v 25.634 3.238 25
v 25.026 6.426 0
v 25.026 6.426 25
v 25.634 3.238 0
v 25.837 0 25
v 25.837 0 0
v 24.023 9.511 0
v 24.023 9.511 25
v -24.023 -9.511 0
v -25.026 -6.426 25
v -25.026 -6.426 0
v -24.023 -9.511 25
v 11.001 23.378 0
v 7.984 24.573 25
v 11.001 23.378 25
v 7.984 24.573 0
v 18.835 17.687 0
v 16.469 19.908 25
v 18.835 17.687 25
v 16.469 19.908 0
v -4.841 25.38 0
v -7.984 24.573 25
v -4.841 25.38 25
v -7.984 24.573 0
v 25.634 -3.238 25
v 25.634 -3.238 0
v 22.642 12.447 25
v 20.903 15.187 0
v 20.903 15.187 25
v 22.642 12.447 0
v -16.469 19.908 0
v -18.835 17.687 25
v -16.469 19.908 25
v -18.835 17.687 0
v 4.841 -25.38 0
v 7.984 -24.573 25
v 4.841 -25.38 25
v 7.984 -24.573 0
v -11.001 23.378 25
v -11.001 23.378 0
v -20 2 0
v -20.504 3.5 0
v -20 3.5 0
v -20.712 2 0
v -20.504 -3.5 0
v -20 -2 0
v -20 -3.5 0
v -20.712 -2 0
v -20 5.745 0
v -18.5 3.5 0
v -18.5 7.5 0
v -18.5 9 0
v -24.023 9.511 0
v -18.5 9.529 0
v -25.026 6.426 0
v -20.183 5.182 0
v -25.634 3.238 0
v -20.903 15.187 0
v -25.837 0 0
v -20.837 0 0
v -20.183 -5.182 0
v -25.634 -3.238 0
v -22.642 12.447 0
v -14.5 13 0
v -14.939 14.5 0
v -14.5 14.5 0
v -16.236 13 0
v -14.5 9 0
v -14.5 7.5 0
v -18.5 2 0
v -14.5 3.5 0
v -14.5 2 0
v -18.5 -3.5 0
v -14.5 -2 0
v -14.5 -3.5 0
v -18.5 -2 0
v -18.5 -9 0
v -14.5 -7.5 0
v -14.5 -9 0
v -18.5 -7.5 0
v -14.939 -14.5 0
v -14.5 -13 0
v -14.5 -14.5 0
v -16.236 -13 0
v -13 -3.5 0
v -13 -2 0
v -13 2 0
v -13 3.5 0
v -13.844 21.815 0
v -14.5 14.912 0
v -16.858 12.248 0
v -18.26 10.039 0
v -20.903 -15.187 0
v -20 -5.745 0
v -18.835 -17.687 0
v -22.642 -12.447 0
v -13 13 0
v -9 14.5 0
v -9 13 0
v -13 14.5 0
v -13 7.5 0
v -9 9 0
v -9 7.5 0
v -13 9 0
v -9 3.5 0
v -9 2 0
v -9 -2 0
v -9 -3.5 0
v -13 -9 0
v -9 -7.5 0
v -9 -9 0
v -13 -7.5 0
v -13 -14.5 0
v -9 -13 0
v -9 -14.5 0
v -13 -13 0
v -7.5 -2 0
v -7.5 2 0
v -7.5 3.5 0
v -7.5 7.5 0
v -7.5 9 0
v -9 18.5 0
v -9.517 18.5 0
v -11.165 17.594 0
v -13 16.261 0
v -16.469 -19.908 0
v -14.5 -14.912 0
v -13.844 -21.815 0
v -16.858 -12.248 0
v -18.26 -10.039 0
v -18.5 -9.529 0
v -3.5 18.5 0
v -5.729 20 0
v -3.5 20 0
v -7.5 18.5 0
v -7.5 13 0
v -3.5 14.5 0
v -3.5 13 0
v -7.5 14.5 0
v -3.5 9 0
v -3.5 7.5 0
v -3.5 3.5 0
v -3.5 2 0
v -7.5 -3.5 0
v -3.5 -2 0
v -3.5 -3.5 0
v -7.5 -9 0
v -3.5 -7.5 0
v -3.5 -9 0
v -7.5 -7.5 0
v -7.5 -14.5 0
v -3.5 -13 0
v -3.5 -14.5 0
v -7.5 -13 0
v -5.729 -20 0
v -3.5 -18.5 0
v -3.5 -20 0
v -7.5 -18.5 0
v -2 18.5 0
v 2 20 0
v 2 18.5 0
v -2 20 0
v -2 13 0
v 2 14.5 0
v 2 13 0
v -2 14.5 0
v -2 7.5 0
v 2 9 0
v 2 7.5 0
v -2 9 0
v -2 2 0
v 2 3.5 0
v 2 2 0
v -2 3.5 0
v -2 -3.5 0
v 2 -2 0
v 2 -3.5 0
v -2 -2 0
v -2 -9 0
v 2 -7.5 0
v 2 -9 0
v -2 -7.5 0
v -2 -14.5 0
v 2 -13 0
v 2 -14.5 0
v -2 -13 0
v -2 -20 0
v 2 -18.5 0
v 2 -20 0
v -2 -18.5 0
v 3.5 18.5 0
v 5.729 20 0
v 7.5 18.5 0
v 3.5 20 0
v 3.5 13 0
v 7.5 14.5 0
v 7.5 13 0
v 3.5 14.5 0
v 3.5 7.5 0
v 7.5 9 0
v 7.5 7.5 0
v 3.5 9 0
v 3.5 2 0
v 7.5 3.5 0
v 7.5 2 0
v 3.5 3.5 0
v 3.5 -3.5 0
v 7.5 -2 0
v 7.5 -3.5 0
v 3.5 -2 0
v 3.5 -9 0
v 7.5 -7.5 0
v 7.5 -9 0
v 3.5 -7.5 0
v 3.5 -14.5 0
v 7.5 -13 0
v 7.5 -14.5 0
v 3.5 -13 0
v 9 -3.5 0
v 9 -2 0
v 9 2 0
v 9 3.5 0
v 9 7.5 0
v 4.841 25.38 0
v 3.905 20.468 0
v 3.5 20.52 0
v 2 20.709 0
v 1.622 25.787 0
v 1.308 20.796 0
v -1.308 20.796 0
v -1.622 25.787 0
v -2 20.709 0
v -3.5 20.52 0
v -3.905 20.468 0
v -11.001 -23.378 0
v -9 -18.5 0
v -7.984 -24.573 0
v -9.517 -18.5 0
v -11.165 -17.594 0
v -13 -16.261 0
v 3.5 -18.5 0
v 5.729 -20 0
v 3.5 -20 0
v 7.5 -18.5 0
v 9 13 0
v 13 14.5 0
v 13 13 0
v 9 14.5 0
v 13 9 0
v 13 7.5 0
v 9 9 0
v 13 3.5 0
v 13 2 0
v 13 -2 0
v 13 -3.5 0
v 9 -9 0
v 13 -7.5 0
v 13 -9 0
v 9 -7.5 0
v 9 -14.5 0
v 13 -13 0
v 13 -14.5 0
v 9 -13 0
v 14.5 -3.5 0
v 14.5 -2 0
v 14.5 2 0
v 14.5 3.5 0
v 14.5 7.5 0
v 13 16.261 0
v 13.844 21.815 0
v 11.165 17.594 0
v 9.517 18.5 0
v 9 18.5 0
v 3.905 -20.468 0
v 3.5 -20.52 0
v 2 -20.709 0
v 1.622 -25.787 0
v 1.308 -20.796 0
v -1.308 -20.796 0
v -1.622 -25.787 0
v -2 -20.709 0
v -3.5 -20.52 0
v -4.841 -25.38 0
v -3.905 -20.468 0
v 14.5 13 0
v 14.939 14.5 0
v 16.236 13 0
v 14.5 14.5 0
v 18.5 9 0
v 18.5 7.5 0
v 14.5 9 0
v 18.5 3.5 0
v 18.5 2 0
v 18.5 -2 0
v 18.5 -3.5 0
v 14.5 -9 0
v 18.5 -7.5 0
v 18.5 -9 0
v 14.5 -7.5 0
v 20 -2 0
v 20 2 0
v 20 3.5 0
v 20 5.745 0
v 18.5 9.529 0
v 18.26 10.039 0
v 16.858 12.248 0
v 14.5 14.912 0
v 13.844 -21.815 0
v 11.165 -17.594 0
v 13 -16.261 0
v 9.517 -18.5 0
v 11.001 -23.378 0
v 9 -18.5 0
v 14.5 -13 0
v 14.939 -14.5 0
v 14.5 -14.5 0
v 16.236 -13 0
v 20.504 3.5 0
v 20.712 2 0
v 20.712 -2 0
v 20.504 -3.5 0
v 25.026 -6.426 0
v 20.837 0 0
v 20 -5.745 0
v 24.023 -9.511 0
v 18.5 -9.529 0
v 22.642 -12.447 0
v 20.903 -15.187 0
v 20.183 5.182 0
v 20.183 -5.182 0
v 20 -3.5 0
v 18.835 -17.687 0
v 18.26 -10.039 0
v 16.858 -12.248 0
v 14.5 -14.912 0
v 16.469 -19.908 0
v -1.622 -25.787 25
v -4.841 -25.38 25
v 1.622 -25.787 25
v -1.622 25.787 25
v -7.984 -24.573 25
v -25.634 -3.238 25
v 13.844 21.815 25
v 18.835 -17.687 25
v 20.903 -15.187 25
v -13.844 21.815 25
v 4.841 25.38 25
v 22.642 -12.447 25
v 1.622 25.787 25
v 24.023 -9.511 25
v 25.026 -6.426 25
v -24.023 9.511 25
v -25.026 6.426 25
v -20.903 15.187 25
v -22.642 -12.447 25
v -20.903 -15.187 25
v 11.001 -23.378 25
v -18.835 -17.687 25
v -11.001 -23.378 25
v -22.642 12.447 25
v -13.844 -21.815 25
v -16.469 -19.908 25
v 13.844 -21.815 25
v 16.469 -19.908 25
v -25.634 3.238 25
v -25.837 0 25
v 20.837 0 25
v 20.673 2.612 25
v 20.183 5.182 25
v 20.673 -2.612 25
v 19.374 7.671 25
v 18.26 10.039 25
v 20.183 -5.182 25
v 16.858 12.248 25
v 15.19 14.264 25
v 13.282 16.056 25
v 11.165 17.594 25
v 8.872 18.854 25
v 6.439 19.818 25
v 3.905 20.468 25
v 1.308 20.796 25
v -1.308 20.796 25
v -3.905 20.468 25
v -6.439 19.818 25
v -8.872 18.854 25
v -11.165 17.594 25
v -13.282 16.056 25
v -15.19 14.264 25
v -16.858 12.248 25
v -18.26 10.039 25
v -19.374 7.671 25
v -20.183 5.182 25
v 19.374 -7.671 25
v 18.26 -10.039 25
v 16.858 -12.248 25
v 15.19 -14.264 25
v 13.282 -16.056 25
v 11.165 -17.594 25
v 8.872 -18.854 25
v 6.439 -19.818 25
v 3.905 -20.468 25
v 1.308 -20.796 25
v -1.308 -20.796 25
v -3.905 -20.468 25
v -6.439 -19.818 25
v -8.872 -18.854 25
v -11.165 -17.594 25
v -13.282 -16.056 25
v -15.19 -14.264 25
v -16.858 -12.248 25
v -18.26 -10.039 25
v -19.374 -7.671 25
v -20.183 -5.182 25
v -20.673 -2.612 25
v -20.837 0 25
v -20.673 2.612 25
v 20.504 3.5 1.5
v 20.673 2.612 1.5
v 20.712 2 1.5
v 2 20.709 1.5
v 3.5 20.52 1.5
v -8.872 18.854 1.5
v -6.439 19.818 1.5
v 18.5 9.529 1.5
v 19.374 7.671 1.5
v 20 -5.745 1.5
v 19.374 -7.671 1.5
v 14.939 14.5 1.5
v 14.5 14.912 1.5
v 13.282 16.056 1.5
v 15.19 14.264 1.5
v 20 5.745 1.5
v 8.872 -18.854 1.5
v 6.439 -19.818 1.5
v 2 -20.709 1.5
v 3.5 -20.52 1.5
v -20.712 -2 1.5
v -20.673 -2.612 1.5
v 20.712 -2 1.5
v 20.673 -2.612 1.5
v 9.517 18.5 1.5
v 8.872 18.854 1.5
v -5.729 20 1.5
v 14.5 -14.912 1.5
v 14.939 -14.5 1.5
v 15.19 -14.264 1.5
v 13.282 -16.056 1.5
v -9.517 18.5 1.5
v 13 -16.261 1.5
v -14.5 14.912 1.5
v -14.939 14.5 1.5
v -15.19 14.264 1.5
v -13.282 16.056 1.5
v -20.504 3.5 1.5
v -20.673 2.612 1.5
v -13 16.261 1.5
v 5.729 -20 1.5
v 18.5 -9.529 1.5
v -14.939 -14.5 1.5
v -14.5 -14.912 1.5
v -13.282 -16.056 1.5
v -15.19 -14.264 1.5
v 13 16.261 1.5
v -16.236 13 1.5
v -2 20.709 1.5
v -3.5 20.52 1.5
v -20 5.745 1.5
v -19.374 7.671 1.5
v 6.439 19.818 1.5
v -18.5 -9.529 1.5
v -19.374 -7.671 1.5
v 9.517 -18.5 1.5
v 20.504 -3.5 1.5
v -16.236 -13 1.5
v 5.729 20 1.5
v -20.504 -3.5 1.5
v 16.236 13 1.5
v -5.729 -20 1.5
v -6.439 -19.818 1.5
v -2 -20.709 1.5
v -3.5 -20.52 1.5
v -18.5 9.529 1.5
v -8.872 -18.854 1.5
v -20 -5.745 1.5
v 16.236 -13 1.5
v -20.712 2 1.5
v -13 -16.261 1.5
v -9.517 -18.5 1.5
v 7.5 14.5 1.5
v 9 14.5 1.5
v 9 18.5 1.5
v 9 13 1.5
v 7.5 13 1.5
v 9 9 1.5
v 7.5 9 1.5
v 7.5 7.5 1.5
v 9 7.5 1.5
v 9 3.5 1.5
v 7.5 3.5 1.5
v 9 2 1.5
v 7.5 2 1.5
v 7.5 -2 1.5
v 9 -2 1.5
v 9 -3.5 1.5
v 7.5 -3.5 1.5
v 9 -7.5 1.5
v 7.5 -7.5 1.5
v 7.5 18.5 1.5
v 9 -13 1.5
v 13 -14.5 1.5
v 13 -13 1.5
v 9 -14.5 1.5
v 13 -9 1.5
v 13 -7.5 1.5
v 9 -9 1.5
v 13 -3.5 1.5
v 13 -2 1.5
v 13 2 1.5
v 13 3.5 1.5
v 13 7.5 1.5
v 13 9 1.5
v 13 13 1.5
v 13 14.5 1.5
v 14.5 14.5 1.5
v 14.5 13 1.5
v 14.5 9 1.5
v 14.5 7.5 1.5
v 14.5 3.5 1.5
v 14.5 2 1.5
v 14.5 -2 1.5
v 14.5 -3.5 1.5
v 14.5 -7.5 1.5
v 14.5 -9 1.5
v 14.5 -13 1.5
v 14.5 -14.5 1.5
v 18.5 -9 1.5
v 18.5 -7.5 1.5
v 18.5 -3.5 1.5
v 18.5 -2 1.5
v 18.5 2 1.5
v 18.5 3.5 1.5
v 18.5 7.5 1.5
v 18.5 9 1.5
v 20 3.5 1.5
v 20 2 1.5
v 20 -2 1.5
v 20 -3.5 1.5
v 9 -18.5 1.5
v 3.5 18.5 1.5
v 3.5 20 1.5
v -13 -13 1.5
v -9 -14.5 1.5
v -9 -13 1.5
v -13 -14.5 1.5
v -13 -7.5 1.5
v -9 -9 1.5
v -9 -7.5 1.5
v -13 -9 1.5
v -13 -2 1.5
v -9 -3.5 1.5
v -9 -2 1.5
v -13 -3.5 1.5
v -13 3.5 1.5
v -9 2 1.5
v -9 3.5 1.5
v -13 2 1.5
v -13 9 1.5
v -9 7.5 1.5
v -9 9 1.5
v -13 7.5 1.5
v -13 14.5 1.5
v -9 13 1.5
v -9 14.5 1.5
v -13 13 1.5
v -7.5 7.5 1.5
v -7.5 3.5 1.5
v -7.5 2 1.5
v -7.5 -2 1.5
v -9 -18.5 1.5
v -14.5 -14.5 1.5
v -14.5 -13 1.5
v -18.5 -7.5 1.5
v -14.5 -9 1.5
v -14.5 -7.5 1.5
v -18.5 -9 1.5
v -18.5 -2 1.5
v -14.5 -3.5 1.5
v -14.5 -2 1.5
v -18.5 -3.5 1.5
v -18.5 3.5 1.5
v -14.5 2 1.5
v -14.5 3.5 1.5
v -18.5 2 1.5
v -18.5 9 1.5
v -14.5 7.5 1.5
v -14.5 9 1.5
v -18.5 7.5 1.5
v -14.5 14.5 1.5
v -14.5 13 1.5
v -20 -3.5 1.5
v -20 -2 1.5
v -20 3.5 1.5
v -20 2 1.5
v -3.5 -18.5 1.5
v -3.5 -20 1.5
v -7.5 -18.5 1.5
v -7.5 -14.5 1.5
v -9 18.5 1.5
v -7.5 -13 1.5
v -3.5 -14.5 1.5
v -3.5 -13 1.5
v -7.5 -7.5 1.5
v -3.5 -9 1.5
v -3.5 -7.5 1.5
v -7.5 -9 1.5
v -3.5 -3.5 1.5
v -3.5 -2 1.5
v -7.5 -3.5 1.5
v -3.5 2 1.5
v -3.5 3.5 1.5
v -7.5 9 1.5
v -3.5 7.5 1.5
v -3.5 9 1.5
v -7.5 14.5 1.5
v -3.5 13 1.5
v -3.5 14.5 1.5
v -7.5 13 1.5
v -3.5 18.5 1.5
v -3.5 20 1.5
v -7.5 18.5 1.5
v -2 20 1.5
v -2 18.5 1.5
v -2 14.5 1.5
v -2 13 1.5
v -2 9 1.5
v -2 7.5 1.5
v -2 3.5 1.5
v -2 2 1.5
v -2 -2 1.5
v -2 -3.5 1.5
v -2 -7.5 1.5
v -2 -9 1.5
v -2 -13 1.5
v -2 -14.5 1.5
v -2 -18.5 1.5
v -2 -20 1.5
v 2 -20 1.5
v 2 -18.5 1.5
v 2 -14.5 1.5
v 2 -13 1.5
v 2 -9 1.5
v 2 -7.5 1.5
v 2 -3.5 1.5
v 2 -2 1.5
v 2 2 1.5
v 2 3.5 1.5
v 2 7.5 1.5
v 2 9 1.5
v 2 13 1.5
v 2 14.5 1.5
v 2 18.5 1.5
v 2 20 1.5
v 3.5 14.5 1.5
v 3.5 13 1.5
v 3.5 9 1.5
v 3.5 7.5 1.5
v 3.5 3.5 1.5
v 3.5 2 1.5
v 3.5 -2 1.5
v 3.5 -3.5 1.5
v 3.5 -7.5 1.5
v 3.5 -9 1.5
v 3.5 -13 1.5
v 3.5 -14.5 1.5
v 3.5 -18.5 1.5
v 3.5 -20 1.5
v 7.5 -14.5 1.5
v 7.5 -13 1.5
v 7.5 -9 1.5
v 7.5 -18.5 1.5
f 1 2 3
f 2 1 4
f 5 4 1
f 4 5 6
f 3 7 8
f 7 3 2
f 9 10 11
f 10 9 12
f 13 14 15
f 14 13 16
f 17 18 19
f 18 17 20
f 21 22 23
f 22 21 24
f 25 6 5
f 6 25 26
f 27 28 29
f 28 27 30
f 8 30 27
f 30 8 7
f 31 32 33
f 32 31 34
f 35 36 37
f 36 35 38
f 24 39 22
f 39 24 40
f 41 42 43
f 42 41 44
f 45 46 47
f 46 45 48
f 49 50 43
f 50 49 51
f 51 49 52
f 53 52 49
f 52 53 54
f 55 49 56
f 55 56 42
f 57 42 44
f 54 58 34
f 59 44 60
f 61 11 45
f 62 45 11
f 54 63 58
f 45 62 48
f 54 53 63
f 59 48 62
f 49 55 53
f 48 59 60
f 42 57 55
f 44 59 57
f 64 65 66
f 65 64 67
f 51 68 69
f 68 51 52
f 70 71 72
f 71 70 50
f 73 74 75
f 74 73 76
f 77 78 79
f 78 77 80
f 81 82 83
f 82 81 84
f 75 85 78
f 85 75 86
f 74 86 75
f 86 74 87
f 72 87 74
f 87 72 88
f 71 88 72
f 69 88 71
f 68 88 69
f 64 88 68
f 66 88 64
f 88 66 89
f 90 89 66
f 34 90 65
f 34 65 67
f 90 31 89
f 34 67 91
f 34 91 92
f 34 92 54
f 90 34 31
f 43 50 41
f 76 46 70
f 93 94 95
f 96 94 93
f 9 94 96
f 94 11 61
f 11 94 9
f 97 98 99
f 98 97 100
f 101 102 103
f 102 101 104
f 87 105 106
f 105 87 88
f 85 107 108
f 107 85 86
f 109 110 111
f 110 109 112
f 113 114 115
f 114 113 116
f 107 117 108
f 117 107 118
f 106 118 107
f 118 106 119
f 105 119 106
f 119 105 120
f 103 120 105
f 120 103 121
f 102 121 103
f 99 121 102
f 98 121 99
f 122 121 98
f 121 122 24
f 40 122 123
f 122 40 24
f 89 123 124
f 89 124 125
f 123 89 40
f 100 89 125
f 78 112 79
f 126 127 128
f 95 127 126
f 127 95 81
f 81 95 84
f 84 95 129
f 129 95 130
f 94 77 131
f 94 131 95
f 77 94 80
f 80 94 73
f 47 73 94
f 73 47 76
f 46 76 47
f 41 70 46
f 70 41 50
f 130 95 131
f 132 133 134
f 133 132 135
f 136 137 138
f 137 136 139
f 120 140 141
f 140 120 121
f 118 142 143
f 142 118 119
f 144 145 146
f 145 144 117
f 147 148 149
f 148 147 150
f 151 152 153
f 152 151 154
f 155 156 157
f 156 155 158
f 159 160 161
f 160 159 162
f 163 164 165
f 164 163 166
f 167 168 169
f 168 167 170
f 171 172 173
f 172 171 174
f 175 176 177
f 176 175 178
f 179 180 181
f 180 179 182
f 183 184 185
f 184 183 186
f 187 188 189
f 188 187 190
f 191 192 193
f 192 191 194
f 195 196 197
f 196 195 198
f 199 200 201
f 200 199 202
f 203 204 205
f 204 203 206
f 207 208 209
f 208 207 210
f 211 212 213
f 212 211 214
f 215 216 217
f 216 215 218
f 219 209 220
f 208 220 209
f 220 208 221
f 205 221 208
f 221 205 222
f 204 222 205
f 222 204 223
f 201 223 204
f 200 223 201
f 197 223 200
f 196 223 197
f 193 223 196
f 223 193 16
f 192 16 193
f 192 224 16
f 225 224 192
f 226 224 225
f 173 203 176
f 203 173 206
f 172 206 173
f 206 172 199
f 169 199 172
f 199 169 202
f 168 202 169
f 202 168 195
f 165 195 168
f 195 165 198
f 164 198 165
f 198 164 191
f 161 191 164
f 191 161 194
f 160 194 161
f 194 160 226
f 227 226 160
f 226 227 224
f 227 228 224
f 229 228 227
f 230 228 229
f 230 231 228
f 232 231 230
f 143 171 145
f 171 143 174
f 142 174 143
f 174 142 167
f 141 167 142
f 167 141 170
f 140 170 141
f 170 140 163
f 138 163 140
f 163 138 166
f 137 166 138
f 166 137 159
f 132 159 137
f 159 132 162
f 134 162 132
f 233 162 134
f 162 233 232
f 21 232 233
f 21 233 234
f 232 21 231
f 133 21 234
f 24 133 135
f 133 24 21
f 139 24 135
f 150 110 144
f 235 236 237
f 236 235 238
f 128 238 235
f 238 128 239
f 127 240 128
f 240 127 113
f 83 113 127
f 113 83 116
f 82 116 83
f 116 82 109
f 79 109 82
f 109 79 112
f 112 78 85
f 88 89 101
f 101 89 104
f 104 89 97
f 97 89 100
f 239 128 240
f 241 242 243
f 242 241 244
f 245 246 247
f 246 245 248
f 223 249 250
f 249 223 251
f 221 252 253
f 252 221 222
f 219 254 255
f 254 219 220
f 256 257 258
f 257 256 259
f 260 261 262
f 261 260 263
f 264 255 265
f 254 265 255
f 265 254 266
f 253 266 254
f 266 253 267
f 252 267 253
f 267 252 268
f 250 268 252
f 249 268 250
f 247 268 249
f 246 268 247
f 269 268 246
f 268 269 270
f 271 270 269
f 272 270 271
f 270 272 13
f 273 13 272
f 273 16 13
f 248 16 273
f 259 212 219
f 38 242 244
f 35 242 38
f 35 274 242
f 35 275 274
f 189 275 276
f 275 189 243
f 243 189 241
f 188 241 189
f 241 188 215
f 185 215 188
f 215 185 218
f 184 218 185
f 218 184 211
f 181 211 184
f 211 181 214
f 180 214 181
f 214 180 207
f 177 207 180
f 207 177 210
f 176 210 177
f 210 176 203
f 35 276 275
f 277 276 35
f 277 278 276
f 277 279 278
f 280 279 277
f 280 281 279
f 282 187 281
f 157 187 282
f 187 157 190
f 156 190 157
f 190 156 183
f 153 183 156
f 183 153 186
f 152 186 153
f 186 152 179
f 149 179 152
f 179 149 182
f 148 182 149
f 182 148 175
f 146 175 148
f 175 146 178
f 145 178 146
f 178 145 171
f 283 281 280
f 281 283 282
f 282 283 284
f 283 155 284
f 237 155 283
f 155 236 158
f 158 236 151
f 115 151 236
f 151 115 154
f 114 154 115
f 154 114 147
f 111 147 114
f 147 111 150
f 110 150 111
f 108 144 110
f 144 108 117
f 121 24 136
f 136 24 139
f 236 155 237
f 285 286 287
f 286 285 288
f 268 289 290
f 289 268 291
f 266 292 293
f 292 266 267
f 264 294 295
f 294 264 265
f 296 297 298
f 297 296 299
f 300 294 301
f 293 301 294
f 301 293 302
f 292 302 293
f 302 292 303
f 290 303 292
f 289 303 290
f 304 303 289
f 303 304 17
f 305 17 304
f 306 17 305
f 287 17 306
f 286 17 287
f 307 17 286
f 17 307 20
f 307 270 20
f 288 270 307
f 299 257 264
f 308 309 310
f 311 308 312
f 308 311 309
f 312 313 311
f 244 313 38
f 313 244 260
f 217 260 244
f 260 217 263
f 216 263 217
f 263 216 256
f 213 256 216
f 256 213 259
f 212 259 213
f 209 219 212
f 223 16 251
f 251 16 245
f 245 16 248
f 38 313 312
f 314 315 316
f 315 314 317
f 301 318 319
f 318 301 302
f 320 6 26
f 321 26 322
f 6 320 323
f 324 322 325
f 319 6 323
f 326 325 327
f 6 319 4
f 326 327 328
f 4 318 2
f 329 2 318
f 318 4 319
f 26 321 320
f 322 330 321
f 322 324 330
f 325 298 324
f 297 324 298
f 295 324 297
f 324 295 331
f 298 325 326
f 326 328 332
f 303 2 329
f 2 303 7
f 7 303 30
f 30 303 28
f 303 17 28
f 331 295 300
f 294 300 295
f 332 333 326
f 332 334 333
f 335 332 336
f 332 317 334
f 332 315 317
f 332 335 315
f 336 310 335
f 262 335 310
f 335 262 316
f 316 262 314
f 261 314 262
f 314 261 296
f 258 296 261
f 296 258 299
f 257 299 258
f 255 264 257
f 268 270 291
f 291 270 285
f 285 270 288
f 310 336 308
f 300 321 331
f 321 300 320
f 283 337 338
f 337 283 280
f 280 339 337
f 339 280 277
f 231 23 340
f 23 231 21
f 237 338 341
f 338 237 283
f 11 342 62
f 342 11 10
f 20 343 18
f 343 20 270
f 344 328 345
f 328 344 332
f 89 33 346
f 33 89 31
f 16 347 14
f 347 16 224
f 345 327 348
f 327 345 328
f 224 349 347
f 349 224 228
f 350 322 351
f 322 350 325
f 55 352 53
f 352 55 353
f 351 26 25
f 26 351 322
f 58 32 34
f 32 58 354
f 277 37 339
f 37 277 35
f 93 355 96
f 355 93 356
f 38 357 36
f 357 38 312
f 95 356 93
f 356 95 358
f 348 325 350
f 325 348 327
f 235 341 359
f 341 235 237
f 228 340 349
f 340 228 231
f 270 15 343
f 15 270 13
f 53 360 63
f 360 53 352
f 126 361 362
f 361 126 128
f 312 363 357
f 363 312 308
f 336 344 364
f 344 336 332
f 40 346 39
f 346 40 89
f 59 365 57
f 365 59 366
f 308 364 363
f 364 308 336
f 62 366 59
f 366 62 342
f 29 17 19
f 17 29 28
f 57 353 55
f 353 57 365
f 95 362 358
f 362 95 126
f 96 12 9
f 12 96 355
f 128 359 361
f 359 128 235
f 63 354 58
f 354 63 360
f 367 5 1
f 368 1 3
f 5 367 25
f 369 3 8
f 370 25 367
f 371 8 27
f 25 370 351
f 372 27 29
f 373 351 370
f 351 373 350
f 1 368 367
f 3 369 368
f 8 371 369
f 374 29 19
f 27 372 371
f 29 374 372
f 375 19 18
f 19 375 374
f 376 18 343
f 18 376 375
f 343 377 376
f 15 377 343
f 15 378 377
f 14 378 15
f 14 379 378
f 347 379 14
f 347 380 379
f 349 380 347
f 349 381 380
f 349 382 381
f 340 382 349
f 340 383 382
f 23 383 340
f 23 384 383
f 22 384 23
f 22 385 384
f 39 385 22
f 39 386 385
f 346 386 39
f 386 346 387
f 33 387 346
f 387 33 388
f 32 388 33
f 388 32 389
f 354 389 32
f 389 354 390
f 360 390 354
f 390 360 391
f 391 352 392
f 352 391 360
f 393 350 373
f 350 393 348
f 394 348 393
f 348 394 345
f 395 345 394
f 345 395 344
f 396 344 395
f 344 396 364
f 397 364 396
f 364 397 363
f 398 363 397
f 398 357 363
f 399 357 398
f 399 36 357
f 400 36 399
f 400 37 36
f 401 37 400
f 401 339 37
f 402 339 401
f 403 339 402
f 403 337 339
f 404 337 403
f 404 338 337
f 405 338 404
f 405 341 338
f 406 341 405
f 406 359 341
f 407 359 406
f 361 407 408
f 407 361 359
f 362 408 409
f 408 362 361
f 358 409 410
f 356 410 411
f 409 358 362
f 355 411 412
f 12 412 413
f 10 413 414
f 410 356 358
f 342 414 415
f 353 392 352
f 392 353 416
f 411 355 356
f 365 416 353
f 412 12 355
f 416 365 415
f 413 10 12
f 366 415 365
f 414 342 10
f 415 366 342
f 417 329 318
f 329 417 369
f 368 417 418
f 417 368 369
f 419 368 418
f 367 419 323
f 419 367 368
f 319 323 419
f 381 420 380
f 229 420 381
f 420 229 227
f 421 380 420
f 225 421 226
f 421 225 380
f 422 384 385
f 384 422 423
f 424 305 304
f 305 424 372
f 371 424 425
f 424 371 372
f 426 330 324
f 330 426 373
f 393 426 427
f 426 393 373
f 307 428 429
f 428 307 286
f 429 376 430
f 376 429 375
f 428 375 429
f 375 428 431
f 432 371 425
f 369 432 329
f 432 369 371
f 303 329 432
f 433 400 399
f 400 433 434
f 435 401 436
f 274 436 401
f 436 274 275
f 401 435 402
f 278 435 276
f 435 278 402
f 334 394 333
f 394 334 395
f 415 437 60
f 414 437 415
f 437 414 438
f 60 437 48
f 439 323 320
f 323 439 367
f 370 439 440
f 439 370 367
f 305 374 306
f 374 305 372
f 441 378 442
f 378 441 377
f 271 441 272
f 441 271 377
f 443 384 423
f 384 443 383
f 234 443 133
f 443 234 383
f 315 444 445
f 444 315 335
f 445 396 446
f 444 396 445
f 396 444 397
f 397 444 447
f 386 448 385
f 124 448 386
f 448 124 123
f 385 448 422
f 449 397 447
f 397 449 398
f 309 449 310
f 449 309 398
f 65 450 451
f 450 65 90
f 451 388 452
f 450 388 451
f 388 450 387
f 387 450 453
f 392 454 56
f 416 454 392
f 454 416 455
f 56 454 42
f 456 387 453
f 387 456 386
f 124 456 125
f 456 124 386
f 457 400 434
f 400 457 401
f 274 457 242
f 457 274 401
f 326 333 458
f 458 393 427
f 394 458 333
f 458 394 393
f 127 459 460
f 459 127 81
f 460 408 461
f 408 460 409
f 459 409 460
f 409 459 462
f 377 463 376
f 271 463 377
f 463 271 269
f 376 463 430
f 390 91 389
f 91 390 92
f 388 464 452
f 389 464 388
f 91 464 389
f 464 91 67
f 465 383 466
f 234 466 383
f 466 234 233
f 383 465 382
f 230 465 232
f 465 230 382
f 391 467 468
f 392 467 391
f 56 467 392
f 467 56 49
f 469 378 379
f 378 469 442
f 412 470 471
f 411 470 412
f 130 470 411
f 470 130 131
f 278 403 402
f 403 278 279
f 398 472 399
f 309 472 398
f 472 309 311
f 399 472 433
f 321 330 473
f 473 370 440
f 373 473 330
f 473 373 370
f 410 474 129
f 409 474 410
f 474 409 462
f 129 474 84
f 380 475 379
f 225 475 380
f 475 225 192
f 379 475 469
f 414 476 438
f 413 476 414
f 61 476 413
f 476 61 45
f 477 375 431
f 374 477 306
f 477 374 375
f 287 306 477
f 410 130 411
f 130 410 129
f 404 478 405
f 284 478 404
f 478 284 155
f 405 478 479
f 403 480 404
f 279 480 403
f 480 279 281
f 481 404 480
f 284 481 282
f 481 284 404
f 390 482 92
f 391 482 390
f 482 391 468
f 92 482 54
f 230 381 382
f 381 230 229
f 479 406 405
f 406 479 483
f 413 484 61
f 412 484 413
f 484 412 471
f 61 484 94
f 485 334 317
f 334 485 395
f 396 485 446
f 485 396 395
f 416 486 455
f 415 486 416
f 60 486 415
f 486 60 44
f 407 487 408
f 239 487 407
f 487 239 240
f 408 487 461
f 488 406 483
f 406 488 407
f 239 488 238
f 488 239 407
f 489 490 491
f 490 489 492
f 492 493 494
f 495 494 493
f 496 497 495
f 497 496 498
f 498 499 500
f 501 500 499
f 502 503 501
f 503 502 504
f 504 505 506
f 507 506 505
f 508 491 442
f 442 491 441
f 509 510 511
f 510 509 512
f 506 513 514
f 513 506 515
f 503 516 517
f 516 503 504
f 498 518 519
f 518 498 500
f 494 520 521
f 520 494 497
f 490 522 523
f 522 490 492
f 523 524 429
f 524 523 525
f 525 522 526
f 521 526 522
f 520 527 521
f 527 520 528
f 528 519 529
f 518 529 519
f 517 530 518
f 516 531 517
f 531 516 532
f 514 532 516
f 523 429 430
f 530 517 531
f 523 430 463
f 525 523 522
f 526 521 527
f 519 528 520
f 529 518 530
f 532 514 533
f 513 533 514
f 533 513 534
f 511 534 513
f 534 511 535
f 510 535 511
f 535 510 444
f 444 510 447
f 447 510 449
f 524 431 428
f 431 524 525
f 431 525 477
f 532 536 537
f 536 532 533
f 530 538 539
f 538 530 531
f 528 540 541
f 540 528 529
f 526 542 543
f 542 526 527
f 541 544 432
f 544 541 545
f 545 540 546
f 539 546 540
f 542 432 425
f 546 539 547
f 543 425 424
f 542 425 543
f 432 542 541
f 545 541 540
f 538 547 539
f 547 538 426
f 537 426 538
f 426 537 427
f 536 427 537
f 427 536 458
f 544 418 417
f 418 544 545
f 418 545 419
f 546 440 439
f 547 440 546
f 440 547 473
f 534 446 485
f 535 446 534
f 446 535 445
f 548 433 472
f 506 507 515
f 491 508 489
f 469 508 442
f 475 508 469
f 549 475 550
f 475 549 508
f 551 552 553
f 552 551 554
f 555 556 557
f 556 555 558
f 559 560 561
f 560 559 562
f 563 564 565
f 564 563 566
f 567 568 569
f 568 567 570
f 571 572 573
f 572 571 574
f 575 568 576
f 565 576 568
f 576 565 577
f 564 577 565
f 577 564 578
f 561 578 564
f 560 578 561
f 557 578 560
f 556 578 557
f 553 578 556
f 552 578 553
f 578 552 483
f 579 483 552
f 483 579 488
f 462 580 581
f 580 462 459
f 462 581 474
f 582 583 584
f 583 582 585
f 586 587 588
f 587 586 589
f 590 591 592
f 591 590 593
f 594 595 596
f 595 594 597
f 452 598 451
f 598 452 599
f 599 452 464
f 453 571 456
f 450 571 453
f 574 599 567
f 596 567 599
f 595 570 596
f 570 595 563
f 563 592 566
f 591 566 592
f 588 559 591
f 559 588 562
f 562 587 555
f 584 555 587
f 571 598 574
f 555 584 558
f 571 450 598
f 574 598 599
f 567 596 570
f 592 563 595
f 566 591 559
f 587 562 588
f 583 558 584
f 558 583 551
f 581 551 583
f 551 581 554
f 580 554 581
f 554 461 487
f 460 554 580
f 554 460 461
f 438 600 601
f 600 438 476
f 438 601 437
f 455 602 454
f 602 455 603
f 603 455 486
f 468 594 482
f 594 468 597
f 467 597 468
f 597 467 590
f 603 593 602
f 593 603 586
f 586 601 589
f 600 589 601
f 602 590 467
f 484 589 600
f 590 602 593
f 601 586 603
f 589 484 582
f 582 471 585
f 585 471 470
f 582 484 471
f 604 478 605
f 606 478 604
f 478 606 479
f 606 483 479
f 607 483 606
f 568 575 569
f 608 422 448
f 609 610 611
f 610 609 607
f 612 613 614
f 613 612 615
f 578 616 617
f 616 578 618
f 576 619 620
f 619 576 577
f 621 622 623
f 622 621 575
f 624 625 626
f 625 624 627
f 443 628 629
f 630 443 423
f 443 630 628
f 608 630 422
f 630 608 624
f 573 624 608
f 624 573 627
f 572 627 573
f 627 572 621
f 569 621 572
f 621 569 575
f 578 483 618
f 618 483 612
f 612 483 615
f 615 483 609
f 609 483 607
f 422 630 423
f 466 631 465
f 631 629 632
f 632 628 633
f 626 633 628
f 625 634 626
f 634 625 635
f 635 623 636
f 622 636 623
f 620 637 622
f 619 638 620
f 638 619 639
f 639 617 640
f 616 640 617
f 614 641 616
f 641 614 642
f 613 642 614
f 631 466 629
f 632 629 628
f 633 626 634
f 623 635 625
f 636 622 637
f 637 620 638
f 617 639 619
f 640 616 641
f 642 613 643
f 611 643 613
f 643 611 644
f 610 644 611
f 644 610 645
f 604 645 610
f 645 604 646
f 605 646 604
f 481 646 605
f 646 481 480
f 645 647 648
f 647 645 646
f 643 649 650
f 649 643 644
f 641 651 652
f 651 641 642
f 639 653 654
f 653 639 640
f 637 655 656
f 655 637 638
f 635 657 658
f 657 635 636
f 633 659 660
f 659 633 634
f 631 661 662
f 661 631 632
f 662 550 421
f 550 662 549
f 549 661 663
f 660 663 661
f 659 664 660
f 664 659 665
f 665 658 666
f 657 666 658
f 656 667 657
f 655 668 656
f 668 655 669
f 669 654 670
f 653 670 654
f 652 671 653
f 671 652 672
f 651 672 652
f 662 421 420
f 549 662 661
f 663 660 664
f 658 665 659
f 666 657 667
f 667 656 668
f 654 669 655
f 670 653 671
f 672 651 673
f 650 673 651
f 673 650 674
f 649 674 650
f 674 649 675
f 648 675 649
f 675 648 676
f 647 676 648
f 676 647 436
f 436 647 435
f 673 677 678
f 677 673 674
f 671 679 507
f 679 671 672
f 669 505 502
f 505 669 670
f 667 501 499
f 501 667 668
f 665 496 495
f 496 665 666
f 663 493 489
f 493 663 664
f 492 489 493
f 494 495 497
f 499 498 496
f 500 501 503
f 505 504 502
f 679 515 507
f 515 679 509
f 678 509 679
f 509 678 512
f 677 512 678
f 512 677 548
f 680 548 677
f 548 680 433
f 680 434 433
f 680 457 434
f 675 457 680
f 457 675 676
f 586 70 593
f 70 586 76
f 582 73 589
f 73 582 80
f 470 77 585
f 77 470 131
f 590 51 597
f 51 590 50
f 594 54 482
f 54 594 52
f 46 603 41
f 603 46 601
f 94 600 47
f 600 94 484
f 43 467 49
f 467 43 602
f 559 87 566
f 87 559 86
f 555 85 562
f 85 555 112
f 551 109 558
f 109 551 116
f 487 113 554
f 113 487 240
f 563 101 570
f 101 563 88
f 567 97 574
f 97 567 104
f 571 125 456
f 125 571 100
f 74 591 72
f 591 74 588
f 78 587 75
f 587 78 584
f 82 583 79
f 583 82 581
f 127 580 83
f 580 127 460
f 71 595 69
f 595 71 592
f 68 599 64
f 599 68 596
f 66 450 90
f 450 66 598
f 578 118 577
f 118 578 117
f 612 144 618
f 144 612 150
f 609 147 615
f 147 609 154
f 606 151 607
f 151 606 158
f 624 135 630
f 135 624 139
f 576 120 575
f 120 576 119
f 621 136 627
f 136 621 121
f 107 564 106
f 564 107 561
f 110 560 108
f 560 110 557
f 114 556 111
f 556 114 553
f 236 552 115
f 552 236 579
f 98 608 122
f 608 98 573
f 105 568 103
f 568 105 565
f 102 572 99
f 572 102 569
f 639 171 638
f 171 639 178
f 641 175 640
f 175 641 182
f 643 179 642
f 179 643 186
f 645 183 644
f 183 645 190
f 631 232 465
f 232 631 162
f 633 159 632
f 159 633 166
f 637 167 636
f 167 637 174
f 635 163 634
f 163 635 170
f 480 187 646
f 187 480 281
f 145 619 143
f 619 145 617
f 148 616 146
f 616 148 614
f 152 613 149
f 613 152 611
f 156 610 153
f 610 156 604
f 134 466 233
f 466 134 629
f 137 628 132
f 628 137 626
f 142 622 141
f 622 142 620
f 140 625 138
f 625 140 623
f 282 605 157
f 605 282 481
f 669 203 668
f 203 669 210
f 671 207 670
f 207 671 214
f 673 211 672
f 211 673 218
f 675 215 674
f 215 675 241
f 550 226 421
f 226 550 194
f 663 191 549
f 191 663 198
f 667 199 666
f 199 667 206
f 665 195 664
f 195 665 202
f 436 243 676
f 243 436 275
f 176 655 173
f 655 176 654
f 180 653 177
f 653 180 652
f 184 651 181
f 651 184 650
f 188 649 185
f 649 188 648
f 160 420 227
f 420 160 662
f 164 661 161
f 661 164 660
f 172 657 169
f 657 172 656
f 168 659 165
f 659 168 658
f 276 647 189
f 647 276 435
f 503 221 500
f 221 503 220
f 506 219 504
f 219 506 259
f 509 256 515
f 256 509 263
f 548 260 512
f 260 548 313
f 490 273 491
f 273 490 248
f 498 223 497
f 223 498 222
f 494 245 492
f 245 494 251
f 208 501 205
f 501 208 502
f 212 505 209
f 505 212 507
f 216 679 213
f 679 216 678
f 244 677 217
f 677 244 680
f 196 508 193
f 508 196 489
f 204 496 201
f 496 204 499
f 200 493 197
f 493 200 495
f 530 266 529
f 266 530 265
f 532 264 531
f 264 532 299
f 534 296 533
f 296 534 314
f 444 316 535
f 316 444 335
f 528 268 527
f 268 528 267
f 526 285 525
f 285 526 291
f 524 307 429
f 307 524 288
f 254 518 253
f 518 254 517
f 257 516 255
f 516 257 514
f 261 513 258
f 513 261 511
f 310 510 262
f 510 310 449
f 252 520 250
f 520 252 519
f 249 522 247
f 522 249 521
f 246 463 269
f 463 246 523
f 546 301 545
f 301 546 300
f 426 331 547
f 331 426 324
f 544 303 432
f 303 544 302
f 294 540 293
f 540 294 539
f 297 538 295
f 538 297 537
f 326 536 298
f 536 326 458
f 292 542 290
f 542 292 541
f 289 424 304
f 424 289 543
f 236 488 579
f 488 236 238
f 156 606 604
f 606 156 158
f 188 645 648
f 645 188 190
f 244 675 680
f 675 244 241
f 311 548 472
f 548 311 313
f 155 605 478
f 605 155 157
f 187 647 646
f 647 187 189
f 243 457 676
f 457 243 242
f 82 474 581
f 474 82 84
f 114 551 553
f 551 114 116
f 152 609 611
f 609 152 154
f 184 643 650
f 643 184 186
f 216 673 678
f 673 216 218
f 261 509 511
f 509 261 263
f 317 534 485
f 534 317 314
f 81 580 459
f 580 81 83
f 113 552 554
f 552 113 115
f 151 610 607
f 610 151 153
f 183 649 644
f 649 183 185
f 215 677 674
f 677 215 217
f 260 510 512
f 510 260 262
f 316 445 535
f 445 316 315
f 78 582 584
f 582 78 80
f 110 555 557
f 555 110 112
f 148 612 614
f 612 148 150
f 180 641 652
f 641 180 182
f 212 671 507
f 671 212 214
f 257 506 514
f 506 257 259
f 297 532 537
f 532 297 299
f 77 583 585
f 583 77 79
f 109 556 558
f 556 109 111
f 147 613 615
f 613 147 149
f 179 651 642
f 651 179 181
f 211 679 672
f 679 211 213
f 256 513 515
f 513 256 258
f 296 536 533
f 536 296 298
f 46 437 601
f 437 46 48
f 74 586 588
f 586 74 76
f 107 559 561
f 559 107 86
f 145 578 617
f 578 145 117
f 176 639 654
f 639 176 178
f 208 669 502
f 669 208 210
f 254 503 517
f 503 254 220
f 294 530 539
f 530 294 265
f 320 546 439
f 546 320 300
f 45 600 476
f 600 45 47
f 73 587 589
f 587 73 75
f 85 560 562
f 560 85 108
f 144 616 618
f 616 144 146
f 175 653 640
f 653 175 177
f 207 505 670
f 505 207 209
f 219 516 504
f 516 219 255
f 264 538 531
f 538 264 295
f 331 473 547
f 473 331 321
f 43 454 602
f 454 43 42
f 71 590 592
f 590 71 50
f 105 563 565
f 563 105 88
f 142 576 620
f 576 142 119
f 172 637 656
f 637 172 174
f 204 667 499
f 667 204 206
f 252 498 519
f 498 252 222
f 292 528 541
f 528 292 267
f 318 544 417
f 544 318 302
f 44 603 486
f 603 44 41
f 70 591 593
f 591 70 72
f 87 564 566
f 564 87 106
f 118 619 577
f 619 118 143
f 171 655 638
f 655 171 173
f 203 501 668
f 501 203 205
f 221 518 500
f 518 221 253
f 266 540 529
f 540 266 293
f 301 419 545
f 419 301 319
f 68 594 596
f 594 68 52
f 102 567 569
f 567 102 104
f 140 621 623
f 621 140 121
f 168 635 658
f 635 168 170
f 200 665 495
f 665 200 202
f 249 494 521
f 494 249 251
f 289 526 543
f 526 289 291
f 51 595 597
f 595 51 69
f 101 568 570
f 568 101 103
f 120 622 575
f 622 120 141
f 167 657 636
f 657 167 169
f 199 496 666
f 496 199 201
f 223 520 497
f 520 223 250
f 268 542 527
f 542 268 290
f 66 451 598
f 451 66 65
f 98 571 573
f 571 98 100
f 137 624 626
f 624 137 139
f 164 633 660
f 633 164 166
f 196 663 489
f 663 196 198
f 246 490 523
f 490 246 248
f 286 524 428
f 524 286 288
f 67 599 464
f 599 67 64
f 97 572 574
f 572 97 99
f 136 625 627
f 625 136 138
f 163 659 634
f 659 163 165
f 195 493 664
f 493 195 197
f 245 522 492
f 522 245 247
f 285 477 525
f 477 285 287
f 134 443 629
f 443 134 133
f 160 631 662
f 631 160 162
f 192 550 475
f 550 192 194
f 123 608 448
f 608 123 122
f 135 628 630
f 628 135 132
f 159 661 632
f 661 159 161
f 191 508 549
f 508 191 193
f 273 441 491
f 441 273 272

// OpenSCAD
python_od = 41.675; 
grid_spacing = 5.5; 
grid_w = 1.5;
python_ht = 25; 
grid_ht = 1.5; 
outer_wall_w = 5;
eps = 0.01; 

$fn=50; 

module mesh(x, y, spacing, ht, th){ 
  total_x = x*spacing; 
  total_y = y*spacing; 
  for (xdir = [-total_x/2:spacing:total_x/2]) {
     translate([-th/2+xdir,-total_y/2,0]) 
        cube([th,total_y,ht]);  
  }
  for (ydir = [-total_y/2:spacing:total_y/2]) {
    translate([-total_x/2,-th/2+ydir,0]) 
        cube([total_x,th,ht]); 
  }
}

num_mesh = round(python_od/grid_spacing+1);
echo(num_mesh);

module cover() {
  difference() {
    cylinder(h=python_ht, d=python_od+2*outer_wall_w); 
    translate([0,0,-eps]) cylinder(h=python_ht+2*eps, d=python_od); 
  }
  intersection(){
    cylinder(h=python_ht, d=python_od+2*outer_wall_w);
    mesh(num_mesh, num_mesh,grid_spacing,grid_ht,grid_w);  
  }
}

cover(); 
